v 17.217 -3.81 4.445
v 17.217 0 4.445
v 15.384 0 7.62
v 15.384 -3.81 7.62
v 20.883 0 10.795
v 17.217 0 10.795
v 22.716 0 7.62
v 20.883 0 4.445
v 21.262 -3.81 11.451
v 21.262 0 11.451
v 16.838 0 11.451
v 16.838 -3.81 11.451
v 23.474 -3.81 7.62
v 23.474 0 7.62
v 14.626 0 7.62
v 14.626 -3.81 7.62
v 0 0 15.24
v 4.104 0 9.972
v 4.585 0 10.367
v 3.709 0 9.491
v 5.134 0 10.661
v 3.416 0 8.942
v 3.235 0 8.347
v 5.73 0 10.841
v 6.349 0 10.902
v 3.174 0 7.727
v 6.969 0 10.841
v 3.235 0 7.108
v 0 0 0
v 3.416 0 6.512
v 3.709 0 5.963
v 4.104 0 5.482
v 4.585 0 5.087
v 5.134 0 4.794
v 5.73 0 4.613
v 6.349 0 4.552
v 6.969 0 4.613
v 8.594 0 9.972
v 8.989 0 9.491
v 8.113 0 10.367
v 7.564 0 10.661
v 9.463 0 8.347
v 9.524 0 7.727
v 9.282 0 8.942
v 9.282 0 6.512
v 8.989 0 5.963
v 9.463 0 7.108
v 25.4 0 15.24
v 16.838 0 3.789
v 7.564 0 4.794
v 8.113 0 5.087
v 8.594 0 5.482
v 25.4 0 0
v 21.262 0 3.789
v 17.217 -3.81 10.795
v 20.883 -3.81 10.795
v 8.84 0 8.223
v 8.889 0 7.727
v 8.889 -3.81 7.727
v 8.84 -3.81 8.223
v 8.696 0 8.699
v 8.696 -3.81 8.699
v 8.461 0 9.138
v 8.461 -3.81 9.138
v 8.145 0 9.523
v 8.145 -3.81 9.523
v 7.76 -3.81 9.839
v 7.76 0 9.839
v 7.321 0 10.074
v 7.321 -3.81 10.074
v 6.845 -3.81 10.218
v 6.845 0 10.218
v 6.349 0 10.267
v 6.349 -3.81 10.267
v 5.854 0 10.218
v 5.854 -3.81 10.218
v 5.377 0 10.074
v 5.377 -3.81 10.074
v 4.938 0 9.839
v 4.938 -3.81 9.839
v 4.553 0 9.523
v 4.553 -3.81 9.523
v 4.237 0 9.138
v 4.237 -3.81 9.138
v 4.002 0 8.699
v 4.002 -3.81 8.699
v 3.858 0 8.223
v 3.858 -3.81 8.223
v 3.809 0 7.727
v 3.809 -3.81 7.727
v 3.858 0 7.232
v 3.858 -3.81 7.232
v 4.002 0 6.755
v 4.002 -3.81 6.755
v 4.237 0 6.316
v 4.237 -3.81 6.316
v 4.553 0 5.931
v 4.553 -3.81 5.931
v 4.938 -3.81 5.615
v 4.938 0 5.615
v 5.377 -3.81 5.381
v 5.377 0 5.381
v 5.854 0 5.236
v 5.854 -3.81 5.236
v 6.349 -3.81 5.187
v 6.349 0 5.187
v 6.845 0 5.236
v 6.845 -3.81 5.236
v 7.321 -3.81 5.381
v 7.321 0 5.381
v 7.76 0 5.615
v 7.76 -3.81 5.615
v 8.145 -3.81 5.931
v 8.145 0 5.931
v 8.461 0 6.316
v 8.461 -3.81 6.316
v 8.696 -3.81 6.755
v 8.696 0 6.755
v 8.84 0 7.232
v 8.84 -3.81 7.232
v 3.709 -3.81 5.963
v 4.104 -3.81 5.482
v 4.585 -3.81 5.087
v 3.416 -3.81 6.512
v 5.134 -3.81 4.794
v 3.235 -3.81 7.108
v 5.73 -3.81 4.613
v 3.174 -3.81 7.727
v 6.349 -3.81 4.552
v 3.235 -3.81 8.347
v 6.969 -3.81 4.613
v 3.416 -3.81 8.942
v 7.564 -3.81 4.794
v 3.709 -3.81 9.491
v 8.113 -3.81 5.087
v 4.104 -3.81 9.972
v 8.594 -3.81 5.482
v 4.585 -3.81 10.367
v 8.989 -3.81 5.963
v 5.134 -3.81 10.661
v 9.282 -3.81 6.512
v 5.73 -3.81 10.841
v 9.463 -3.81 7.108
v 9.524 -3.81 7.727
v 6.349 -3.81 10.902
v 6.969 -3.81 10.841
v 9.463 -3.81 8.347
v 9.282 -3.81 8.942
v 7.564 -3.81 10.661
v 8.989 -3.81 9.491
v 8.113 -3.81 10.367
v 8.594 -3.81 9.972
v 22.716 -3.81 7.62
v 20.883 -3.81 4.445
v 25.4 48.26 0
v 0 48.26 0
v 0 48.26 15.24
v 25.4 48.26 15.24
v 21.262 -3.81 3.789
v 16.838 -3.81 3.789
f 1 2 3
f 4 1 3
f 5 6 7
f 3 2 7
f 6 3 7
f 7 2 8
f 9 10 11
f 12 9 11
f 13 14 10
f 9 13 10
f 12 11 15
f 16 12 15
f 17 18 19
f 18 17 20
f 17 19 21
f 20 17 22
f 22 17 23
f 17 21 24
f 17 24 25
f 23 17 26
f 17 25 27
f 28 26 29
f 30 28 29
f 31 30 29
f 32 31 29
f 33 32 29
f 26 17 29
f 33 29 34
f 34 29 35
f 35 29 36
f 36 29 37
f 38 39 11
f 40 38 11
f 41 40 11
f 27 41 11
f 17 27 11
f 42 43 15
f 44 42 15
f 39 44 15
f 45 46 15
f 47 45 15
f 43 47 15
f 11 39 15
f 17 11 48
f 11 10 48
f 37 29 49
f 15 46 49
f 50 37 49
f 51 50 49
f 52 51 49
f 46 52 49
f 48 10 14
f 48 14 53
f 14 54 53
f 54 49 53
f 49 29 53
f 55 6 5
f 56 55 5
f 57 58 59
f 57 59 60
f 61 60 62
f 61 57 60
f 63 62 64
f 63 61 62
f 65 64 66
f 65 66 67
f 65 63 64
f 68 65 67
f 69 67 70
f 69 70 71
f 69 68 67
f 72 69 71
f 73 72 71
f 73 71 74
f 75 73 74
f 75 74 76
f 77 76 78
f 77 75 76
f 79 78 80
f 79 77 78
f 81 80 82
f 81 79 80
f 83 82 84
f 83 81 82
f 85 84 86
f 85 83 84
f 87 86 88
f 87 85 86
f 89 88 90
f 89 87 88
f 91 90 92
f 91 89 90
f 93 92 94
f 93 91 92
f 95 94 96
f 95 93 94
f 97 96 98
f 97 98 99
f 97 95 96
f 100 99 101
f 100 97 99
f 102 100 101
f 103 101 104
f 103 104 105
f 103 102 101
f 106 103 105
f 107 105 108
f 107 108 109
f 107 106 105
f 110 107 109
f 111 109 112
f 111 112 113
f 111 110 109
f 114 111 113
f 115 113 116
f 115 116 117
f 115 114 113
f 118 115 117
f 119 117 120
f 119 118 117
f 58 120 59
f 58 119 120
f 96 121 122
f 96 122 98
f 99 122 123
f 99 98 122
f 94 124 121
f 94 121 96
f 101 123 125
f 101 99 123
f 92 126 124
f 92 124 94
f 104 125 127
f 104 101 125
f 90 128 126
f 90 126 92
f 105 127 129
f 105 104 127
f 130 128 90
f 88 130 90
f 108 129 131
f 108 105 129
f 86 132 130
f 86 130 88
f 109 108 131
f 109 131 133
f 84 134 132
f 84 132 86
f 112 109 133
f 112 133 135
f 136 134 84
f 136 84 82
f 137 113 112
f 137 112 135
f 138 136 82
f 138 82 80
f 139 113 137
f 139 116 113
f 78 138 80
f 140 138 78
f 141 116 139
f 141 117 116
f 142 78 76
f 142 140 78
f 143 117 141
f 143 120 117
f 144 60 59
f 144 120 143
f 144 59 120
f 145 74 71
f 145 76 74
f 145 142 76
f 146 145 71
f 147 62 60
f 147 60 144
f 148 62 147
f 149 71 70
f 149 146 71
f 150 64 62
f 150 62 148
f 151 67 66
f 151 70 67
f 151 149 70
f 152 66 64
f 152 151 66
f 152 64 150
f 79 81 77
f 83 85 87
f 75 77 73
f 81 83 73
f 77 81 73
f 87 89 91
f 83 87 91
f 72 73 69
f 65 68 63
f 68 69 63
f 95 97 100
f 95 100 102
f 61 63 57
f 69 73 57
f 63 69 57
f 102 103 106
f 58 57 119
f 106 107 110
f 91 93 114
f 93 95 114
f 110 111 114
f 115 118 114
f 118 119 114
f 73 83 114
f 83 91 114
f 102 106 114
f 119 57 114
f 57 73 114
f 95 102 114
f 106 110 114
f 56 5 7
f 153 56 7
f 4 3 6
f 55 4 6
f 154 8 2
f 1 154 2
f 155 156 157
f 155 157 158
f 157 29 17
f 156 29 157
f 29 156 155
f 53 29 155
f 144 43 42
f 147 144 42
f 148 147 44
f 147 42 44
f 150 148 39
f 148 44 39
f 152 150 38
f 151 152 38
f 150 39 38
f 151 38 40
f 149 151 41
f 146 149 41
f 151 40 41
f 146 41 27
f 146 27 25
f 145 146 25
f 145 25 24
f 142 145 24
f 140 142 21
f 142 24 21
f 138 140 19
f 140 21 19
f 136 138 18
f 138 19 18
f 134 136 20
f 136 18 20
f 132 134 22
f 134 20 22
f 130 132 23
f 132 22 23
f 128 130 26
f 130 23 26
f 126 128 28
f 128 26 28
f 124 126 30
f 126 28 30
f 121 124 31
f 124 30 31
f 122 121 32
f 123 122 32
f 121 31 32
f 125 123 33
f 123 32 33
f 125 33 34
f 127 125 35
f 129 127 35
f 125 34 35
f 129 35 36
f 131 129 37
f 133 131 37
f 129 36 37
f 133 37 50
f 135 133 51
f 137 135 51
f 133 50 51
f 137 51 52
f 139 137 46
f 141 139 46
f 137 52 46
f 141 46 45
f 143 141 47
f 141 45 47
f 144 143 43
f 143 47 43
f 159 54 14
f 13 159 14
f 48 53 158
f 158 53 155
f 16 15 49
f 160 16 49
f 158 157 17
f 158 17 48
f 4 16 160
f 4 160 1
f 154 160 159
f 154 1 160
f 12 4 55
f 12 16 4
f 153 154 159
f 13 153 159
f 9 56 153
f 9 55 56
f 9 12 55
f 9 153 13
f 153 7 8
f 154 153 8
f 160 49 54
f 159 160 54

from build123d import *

# Parameters (mm, degrees)
F0_W     = 25.4
F0_H     = 48.26
F1_DEPTH = 15.24
F2_R     = 3.175
F2_R_2   = 2.54
F3_DEPTH = 3.81
F5_DEPTH = 3.81


with BuildPart() as f1:
    # F0 (on Top) → F1 (new body)
    with BuildSketch(Plane.XY):
        with Locations((12.7, 24.13)):
            Rectangle(F0_W, F0_H)
    extrude(amount=F1_DEPTH)

    # F2 (on face) → F3 (join)
    with BuildSketch(Plane.XZ):
        with Locations((6.349094, 7.727245)):
            Circle(F2_R)
        with Locations((6.349094, 7.727245)):
            Circle(F2_R_2, mode=Mode.SUBTRACT)
    extrude(amount=F3_DEPTH)

    # F4 (on face) → F5 (join)
    with BuildSketch(Plane.XZ):
        Polygon((23.473546, 7.62), (21.261773, 11.450903), (16.838227, 11.450903), (14.626454, 7.62), (16.838227, 3.789097), (21.261773, 3.789097), align=None)
        Polygon((22.716174, 7.62), (20.883087, 4.445), (17.216913, 4.445), (15.383826, 7.62), (17.216913, 10.795), (20.883087, 10.795), align=None, mode=Mode.SUBTRACT)
    extrude(amount=F5_DEPTH)


solid = f1.part
